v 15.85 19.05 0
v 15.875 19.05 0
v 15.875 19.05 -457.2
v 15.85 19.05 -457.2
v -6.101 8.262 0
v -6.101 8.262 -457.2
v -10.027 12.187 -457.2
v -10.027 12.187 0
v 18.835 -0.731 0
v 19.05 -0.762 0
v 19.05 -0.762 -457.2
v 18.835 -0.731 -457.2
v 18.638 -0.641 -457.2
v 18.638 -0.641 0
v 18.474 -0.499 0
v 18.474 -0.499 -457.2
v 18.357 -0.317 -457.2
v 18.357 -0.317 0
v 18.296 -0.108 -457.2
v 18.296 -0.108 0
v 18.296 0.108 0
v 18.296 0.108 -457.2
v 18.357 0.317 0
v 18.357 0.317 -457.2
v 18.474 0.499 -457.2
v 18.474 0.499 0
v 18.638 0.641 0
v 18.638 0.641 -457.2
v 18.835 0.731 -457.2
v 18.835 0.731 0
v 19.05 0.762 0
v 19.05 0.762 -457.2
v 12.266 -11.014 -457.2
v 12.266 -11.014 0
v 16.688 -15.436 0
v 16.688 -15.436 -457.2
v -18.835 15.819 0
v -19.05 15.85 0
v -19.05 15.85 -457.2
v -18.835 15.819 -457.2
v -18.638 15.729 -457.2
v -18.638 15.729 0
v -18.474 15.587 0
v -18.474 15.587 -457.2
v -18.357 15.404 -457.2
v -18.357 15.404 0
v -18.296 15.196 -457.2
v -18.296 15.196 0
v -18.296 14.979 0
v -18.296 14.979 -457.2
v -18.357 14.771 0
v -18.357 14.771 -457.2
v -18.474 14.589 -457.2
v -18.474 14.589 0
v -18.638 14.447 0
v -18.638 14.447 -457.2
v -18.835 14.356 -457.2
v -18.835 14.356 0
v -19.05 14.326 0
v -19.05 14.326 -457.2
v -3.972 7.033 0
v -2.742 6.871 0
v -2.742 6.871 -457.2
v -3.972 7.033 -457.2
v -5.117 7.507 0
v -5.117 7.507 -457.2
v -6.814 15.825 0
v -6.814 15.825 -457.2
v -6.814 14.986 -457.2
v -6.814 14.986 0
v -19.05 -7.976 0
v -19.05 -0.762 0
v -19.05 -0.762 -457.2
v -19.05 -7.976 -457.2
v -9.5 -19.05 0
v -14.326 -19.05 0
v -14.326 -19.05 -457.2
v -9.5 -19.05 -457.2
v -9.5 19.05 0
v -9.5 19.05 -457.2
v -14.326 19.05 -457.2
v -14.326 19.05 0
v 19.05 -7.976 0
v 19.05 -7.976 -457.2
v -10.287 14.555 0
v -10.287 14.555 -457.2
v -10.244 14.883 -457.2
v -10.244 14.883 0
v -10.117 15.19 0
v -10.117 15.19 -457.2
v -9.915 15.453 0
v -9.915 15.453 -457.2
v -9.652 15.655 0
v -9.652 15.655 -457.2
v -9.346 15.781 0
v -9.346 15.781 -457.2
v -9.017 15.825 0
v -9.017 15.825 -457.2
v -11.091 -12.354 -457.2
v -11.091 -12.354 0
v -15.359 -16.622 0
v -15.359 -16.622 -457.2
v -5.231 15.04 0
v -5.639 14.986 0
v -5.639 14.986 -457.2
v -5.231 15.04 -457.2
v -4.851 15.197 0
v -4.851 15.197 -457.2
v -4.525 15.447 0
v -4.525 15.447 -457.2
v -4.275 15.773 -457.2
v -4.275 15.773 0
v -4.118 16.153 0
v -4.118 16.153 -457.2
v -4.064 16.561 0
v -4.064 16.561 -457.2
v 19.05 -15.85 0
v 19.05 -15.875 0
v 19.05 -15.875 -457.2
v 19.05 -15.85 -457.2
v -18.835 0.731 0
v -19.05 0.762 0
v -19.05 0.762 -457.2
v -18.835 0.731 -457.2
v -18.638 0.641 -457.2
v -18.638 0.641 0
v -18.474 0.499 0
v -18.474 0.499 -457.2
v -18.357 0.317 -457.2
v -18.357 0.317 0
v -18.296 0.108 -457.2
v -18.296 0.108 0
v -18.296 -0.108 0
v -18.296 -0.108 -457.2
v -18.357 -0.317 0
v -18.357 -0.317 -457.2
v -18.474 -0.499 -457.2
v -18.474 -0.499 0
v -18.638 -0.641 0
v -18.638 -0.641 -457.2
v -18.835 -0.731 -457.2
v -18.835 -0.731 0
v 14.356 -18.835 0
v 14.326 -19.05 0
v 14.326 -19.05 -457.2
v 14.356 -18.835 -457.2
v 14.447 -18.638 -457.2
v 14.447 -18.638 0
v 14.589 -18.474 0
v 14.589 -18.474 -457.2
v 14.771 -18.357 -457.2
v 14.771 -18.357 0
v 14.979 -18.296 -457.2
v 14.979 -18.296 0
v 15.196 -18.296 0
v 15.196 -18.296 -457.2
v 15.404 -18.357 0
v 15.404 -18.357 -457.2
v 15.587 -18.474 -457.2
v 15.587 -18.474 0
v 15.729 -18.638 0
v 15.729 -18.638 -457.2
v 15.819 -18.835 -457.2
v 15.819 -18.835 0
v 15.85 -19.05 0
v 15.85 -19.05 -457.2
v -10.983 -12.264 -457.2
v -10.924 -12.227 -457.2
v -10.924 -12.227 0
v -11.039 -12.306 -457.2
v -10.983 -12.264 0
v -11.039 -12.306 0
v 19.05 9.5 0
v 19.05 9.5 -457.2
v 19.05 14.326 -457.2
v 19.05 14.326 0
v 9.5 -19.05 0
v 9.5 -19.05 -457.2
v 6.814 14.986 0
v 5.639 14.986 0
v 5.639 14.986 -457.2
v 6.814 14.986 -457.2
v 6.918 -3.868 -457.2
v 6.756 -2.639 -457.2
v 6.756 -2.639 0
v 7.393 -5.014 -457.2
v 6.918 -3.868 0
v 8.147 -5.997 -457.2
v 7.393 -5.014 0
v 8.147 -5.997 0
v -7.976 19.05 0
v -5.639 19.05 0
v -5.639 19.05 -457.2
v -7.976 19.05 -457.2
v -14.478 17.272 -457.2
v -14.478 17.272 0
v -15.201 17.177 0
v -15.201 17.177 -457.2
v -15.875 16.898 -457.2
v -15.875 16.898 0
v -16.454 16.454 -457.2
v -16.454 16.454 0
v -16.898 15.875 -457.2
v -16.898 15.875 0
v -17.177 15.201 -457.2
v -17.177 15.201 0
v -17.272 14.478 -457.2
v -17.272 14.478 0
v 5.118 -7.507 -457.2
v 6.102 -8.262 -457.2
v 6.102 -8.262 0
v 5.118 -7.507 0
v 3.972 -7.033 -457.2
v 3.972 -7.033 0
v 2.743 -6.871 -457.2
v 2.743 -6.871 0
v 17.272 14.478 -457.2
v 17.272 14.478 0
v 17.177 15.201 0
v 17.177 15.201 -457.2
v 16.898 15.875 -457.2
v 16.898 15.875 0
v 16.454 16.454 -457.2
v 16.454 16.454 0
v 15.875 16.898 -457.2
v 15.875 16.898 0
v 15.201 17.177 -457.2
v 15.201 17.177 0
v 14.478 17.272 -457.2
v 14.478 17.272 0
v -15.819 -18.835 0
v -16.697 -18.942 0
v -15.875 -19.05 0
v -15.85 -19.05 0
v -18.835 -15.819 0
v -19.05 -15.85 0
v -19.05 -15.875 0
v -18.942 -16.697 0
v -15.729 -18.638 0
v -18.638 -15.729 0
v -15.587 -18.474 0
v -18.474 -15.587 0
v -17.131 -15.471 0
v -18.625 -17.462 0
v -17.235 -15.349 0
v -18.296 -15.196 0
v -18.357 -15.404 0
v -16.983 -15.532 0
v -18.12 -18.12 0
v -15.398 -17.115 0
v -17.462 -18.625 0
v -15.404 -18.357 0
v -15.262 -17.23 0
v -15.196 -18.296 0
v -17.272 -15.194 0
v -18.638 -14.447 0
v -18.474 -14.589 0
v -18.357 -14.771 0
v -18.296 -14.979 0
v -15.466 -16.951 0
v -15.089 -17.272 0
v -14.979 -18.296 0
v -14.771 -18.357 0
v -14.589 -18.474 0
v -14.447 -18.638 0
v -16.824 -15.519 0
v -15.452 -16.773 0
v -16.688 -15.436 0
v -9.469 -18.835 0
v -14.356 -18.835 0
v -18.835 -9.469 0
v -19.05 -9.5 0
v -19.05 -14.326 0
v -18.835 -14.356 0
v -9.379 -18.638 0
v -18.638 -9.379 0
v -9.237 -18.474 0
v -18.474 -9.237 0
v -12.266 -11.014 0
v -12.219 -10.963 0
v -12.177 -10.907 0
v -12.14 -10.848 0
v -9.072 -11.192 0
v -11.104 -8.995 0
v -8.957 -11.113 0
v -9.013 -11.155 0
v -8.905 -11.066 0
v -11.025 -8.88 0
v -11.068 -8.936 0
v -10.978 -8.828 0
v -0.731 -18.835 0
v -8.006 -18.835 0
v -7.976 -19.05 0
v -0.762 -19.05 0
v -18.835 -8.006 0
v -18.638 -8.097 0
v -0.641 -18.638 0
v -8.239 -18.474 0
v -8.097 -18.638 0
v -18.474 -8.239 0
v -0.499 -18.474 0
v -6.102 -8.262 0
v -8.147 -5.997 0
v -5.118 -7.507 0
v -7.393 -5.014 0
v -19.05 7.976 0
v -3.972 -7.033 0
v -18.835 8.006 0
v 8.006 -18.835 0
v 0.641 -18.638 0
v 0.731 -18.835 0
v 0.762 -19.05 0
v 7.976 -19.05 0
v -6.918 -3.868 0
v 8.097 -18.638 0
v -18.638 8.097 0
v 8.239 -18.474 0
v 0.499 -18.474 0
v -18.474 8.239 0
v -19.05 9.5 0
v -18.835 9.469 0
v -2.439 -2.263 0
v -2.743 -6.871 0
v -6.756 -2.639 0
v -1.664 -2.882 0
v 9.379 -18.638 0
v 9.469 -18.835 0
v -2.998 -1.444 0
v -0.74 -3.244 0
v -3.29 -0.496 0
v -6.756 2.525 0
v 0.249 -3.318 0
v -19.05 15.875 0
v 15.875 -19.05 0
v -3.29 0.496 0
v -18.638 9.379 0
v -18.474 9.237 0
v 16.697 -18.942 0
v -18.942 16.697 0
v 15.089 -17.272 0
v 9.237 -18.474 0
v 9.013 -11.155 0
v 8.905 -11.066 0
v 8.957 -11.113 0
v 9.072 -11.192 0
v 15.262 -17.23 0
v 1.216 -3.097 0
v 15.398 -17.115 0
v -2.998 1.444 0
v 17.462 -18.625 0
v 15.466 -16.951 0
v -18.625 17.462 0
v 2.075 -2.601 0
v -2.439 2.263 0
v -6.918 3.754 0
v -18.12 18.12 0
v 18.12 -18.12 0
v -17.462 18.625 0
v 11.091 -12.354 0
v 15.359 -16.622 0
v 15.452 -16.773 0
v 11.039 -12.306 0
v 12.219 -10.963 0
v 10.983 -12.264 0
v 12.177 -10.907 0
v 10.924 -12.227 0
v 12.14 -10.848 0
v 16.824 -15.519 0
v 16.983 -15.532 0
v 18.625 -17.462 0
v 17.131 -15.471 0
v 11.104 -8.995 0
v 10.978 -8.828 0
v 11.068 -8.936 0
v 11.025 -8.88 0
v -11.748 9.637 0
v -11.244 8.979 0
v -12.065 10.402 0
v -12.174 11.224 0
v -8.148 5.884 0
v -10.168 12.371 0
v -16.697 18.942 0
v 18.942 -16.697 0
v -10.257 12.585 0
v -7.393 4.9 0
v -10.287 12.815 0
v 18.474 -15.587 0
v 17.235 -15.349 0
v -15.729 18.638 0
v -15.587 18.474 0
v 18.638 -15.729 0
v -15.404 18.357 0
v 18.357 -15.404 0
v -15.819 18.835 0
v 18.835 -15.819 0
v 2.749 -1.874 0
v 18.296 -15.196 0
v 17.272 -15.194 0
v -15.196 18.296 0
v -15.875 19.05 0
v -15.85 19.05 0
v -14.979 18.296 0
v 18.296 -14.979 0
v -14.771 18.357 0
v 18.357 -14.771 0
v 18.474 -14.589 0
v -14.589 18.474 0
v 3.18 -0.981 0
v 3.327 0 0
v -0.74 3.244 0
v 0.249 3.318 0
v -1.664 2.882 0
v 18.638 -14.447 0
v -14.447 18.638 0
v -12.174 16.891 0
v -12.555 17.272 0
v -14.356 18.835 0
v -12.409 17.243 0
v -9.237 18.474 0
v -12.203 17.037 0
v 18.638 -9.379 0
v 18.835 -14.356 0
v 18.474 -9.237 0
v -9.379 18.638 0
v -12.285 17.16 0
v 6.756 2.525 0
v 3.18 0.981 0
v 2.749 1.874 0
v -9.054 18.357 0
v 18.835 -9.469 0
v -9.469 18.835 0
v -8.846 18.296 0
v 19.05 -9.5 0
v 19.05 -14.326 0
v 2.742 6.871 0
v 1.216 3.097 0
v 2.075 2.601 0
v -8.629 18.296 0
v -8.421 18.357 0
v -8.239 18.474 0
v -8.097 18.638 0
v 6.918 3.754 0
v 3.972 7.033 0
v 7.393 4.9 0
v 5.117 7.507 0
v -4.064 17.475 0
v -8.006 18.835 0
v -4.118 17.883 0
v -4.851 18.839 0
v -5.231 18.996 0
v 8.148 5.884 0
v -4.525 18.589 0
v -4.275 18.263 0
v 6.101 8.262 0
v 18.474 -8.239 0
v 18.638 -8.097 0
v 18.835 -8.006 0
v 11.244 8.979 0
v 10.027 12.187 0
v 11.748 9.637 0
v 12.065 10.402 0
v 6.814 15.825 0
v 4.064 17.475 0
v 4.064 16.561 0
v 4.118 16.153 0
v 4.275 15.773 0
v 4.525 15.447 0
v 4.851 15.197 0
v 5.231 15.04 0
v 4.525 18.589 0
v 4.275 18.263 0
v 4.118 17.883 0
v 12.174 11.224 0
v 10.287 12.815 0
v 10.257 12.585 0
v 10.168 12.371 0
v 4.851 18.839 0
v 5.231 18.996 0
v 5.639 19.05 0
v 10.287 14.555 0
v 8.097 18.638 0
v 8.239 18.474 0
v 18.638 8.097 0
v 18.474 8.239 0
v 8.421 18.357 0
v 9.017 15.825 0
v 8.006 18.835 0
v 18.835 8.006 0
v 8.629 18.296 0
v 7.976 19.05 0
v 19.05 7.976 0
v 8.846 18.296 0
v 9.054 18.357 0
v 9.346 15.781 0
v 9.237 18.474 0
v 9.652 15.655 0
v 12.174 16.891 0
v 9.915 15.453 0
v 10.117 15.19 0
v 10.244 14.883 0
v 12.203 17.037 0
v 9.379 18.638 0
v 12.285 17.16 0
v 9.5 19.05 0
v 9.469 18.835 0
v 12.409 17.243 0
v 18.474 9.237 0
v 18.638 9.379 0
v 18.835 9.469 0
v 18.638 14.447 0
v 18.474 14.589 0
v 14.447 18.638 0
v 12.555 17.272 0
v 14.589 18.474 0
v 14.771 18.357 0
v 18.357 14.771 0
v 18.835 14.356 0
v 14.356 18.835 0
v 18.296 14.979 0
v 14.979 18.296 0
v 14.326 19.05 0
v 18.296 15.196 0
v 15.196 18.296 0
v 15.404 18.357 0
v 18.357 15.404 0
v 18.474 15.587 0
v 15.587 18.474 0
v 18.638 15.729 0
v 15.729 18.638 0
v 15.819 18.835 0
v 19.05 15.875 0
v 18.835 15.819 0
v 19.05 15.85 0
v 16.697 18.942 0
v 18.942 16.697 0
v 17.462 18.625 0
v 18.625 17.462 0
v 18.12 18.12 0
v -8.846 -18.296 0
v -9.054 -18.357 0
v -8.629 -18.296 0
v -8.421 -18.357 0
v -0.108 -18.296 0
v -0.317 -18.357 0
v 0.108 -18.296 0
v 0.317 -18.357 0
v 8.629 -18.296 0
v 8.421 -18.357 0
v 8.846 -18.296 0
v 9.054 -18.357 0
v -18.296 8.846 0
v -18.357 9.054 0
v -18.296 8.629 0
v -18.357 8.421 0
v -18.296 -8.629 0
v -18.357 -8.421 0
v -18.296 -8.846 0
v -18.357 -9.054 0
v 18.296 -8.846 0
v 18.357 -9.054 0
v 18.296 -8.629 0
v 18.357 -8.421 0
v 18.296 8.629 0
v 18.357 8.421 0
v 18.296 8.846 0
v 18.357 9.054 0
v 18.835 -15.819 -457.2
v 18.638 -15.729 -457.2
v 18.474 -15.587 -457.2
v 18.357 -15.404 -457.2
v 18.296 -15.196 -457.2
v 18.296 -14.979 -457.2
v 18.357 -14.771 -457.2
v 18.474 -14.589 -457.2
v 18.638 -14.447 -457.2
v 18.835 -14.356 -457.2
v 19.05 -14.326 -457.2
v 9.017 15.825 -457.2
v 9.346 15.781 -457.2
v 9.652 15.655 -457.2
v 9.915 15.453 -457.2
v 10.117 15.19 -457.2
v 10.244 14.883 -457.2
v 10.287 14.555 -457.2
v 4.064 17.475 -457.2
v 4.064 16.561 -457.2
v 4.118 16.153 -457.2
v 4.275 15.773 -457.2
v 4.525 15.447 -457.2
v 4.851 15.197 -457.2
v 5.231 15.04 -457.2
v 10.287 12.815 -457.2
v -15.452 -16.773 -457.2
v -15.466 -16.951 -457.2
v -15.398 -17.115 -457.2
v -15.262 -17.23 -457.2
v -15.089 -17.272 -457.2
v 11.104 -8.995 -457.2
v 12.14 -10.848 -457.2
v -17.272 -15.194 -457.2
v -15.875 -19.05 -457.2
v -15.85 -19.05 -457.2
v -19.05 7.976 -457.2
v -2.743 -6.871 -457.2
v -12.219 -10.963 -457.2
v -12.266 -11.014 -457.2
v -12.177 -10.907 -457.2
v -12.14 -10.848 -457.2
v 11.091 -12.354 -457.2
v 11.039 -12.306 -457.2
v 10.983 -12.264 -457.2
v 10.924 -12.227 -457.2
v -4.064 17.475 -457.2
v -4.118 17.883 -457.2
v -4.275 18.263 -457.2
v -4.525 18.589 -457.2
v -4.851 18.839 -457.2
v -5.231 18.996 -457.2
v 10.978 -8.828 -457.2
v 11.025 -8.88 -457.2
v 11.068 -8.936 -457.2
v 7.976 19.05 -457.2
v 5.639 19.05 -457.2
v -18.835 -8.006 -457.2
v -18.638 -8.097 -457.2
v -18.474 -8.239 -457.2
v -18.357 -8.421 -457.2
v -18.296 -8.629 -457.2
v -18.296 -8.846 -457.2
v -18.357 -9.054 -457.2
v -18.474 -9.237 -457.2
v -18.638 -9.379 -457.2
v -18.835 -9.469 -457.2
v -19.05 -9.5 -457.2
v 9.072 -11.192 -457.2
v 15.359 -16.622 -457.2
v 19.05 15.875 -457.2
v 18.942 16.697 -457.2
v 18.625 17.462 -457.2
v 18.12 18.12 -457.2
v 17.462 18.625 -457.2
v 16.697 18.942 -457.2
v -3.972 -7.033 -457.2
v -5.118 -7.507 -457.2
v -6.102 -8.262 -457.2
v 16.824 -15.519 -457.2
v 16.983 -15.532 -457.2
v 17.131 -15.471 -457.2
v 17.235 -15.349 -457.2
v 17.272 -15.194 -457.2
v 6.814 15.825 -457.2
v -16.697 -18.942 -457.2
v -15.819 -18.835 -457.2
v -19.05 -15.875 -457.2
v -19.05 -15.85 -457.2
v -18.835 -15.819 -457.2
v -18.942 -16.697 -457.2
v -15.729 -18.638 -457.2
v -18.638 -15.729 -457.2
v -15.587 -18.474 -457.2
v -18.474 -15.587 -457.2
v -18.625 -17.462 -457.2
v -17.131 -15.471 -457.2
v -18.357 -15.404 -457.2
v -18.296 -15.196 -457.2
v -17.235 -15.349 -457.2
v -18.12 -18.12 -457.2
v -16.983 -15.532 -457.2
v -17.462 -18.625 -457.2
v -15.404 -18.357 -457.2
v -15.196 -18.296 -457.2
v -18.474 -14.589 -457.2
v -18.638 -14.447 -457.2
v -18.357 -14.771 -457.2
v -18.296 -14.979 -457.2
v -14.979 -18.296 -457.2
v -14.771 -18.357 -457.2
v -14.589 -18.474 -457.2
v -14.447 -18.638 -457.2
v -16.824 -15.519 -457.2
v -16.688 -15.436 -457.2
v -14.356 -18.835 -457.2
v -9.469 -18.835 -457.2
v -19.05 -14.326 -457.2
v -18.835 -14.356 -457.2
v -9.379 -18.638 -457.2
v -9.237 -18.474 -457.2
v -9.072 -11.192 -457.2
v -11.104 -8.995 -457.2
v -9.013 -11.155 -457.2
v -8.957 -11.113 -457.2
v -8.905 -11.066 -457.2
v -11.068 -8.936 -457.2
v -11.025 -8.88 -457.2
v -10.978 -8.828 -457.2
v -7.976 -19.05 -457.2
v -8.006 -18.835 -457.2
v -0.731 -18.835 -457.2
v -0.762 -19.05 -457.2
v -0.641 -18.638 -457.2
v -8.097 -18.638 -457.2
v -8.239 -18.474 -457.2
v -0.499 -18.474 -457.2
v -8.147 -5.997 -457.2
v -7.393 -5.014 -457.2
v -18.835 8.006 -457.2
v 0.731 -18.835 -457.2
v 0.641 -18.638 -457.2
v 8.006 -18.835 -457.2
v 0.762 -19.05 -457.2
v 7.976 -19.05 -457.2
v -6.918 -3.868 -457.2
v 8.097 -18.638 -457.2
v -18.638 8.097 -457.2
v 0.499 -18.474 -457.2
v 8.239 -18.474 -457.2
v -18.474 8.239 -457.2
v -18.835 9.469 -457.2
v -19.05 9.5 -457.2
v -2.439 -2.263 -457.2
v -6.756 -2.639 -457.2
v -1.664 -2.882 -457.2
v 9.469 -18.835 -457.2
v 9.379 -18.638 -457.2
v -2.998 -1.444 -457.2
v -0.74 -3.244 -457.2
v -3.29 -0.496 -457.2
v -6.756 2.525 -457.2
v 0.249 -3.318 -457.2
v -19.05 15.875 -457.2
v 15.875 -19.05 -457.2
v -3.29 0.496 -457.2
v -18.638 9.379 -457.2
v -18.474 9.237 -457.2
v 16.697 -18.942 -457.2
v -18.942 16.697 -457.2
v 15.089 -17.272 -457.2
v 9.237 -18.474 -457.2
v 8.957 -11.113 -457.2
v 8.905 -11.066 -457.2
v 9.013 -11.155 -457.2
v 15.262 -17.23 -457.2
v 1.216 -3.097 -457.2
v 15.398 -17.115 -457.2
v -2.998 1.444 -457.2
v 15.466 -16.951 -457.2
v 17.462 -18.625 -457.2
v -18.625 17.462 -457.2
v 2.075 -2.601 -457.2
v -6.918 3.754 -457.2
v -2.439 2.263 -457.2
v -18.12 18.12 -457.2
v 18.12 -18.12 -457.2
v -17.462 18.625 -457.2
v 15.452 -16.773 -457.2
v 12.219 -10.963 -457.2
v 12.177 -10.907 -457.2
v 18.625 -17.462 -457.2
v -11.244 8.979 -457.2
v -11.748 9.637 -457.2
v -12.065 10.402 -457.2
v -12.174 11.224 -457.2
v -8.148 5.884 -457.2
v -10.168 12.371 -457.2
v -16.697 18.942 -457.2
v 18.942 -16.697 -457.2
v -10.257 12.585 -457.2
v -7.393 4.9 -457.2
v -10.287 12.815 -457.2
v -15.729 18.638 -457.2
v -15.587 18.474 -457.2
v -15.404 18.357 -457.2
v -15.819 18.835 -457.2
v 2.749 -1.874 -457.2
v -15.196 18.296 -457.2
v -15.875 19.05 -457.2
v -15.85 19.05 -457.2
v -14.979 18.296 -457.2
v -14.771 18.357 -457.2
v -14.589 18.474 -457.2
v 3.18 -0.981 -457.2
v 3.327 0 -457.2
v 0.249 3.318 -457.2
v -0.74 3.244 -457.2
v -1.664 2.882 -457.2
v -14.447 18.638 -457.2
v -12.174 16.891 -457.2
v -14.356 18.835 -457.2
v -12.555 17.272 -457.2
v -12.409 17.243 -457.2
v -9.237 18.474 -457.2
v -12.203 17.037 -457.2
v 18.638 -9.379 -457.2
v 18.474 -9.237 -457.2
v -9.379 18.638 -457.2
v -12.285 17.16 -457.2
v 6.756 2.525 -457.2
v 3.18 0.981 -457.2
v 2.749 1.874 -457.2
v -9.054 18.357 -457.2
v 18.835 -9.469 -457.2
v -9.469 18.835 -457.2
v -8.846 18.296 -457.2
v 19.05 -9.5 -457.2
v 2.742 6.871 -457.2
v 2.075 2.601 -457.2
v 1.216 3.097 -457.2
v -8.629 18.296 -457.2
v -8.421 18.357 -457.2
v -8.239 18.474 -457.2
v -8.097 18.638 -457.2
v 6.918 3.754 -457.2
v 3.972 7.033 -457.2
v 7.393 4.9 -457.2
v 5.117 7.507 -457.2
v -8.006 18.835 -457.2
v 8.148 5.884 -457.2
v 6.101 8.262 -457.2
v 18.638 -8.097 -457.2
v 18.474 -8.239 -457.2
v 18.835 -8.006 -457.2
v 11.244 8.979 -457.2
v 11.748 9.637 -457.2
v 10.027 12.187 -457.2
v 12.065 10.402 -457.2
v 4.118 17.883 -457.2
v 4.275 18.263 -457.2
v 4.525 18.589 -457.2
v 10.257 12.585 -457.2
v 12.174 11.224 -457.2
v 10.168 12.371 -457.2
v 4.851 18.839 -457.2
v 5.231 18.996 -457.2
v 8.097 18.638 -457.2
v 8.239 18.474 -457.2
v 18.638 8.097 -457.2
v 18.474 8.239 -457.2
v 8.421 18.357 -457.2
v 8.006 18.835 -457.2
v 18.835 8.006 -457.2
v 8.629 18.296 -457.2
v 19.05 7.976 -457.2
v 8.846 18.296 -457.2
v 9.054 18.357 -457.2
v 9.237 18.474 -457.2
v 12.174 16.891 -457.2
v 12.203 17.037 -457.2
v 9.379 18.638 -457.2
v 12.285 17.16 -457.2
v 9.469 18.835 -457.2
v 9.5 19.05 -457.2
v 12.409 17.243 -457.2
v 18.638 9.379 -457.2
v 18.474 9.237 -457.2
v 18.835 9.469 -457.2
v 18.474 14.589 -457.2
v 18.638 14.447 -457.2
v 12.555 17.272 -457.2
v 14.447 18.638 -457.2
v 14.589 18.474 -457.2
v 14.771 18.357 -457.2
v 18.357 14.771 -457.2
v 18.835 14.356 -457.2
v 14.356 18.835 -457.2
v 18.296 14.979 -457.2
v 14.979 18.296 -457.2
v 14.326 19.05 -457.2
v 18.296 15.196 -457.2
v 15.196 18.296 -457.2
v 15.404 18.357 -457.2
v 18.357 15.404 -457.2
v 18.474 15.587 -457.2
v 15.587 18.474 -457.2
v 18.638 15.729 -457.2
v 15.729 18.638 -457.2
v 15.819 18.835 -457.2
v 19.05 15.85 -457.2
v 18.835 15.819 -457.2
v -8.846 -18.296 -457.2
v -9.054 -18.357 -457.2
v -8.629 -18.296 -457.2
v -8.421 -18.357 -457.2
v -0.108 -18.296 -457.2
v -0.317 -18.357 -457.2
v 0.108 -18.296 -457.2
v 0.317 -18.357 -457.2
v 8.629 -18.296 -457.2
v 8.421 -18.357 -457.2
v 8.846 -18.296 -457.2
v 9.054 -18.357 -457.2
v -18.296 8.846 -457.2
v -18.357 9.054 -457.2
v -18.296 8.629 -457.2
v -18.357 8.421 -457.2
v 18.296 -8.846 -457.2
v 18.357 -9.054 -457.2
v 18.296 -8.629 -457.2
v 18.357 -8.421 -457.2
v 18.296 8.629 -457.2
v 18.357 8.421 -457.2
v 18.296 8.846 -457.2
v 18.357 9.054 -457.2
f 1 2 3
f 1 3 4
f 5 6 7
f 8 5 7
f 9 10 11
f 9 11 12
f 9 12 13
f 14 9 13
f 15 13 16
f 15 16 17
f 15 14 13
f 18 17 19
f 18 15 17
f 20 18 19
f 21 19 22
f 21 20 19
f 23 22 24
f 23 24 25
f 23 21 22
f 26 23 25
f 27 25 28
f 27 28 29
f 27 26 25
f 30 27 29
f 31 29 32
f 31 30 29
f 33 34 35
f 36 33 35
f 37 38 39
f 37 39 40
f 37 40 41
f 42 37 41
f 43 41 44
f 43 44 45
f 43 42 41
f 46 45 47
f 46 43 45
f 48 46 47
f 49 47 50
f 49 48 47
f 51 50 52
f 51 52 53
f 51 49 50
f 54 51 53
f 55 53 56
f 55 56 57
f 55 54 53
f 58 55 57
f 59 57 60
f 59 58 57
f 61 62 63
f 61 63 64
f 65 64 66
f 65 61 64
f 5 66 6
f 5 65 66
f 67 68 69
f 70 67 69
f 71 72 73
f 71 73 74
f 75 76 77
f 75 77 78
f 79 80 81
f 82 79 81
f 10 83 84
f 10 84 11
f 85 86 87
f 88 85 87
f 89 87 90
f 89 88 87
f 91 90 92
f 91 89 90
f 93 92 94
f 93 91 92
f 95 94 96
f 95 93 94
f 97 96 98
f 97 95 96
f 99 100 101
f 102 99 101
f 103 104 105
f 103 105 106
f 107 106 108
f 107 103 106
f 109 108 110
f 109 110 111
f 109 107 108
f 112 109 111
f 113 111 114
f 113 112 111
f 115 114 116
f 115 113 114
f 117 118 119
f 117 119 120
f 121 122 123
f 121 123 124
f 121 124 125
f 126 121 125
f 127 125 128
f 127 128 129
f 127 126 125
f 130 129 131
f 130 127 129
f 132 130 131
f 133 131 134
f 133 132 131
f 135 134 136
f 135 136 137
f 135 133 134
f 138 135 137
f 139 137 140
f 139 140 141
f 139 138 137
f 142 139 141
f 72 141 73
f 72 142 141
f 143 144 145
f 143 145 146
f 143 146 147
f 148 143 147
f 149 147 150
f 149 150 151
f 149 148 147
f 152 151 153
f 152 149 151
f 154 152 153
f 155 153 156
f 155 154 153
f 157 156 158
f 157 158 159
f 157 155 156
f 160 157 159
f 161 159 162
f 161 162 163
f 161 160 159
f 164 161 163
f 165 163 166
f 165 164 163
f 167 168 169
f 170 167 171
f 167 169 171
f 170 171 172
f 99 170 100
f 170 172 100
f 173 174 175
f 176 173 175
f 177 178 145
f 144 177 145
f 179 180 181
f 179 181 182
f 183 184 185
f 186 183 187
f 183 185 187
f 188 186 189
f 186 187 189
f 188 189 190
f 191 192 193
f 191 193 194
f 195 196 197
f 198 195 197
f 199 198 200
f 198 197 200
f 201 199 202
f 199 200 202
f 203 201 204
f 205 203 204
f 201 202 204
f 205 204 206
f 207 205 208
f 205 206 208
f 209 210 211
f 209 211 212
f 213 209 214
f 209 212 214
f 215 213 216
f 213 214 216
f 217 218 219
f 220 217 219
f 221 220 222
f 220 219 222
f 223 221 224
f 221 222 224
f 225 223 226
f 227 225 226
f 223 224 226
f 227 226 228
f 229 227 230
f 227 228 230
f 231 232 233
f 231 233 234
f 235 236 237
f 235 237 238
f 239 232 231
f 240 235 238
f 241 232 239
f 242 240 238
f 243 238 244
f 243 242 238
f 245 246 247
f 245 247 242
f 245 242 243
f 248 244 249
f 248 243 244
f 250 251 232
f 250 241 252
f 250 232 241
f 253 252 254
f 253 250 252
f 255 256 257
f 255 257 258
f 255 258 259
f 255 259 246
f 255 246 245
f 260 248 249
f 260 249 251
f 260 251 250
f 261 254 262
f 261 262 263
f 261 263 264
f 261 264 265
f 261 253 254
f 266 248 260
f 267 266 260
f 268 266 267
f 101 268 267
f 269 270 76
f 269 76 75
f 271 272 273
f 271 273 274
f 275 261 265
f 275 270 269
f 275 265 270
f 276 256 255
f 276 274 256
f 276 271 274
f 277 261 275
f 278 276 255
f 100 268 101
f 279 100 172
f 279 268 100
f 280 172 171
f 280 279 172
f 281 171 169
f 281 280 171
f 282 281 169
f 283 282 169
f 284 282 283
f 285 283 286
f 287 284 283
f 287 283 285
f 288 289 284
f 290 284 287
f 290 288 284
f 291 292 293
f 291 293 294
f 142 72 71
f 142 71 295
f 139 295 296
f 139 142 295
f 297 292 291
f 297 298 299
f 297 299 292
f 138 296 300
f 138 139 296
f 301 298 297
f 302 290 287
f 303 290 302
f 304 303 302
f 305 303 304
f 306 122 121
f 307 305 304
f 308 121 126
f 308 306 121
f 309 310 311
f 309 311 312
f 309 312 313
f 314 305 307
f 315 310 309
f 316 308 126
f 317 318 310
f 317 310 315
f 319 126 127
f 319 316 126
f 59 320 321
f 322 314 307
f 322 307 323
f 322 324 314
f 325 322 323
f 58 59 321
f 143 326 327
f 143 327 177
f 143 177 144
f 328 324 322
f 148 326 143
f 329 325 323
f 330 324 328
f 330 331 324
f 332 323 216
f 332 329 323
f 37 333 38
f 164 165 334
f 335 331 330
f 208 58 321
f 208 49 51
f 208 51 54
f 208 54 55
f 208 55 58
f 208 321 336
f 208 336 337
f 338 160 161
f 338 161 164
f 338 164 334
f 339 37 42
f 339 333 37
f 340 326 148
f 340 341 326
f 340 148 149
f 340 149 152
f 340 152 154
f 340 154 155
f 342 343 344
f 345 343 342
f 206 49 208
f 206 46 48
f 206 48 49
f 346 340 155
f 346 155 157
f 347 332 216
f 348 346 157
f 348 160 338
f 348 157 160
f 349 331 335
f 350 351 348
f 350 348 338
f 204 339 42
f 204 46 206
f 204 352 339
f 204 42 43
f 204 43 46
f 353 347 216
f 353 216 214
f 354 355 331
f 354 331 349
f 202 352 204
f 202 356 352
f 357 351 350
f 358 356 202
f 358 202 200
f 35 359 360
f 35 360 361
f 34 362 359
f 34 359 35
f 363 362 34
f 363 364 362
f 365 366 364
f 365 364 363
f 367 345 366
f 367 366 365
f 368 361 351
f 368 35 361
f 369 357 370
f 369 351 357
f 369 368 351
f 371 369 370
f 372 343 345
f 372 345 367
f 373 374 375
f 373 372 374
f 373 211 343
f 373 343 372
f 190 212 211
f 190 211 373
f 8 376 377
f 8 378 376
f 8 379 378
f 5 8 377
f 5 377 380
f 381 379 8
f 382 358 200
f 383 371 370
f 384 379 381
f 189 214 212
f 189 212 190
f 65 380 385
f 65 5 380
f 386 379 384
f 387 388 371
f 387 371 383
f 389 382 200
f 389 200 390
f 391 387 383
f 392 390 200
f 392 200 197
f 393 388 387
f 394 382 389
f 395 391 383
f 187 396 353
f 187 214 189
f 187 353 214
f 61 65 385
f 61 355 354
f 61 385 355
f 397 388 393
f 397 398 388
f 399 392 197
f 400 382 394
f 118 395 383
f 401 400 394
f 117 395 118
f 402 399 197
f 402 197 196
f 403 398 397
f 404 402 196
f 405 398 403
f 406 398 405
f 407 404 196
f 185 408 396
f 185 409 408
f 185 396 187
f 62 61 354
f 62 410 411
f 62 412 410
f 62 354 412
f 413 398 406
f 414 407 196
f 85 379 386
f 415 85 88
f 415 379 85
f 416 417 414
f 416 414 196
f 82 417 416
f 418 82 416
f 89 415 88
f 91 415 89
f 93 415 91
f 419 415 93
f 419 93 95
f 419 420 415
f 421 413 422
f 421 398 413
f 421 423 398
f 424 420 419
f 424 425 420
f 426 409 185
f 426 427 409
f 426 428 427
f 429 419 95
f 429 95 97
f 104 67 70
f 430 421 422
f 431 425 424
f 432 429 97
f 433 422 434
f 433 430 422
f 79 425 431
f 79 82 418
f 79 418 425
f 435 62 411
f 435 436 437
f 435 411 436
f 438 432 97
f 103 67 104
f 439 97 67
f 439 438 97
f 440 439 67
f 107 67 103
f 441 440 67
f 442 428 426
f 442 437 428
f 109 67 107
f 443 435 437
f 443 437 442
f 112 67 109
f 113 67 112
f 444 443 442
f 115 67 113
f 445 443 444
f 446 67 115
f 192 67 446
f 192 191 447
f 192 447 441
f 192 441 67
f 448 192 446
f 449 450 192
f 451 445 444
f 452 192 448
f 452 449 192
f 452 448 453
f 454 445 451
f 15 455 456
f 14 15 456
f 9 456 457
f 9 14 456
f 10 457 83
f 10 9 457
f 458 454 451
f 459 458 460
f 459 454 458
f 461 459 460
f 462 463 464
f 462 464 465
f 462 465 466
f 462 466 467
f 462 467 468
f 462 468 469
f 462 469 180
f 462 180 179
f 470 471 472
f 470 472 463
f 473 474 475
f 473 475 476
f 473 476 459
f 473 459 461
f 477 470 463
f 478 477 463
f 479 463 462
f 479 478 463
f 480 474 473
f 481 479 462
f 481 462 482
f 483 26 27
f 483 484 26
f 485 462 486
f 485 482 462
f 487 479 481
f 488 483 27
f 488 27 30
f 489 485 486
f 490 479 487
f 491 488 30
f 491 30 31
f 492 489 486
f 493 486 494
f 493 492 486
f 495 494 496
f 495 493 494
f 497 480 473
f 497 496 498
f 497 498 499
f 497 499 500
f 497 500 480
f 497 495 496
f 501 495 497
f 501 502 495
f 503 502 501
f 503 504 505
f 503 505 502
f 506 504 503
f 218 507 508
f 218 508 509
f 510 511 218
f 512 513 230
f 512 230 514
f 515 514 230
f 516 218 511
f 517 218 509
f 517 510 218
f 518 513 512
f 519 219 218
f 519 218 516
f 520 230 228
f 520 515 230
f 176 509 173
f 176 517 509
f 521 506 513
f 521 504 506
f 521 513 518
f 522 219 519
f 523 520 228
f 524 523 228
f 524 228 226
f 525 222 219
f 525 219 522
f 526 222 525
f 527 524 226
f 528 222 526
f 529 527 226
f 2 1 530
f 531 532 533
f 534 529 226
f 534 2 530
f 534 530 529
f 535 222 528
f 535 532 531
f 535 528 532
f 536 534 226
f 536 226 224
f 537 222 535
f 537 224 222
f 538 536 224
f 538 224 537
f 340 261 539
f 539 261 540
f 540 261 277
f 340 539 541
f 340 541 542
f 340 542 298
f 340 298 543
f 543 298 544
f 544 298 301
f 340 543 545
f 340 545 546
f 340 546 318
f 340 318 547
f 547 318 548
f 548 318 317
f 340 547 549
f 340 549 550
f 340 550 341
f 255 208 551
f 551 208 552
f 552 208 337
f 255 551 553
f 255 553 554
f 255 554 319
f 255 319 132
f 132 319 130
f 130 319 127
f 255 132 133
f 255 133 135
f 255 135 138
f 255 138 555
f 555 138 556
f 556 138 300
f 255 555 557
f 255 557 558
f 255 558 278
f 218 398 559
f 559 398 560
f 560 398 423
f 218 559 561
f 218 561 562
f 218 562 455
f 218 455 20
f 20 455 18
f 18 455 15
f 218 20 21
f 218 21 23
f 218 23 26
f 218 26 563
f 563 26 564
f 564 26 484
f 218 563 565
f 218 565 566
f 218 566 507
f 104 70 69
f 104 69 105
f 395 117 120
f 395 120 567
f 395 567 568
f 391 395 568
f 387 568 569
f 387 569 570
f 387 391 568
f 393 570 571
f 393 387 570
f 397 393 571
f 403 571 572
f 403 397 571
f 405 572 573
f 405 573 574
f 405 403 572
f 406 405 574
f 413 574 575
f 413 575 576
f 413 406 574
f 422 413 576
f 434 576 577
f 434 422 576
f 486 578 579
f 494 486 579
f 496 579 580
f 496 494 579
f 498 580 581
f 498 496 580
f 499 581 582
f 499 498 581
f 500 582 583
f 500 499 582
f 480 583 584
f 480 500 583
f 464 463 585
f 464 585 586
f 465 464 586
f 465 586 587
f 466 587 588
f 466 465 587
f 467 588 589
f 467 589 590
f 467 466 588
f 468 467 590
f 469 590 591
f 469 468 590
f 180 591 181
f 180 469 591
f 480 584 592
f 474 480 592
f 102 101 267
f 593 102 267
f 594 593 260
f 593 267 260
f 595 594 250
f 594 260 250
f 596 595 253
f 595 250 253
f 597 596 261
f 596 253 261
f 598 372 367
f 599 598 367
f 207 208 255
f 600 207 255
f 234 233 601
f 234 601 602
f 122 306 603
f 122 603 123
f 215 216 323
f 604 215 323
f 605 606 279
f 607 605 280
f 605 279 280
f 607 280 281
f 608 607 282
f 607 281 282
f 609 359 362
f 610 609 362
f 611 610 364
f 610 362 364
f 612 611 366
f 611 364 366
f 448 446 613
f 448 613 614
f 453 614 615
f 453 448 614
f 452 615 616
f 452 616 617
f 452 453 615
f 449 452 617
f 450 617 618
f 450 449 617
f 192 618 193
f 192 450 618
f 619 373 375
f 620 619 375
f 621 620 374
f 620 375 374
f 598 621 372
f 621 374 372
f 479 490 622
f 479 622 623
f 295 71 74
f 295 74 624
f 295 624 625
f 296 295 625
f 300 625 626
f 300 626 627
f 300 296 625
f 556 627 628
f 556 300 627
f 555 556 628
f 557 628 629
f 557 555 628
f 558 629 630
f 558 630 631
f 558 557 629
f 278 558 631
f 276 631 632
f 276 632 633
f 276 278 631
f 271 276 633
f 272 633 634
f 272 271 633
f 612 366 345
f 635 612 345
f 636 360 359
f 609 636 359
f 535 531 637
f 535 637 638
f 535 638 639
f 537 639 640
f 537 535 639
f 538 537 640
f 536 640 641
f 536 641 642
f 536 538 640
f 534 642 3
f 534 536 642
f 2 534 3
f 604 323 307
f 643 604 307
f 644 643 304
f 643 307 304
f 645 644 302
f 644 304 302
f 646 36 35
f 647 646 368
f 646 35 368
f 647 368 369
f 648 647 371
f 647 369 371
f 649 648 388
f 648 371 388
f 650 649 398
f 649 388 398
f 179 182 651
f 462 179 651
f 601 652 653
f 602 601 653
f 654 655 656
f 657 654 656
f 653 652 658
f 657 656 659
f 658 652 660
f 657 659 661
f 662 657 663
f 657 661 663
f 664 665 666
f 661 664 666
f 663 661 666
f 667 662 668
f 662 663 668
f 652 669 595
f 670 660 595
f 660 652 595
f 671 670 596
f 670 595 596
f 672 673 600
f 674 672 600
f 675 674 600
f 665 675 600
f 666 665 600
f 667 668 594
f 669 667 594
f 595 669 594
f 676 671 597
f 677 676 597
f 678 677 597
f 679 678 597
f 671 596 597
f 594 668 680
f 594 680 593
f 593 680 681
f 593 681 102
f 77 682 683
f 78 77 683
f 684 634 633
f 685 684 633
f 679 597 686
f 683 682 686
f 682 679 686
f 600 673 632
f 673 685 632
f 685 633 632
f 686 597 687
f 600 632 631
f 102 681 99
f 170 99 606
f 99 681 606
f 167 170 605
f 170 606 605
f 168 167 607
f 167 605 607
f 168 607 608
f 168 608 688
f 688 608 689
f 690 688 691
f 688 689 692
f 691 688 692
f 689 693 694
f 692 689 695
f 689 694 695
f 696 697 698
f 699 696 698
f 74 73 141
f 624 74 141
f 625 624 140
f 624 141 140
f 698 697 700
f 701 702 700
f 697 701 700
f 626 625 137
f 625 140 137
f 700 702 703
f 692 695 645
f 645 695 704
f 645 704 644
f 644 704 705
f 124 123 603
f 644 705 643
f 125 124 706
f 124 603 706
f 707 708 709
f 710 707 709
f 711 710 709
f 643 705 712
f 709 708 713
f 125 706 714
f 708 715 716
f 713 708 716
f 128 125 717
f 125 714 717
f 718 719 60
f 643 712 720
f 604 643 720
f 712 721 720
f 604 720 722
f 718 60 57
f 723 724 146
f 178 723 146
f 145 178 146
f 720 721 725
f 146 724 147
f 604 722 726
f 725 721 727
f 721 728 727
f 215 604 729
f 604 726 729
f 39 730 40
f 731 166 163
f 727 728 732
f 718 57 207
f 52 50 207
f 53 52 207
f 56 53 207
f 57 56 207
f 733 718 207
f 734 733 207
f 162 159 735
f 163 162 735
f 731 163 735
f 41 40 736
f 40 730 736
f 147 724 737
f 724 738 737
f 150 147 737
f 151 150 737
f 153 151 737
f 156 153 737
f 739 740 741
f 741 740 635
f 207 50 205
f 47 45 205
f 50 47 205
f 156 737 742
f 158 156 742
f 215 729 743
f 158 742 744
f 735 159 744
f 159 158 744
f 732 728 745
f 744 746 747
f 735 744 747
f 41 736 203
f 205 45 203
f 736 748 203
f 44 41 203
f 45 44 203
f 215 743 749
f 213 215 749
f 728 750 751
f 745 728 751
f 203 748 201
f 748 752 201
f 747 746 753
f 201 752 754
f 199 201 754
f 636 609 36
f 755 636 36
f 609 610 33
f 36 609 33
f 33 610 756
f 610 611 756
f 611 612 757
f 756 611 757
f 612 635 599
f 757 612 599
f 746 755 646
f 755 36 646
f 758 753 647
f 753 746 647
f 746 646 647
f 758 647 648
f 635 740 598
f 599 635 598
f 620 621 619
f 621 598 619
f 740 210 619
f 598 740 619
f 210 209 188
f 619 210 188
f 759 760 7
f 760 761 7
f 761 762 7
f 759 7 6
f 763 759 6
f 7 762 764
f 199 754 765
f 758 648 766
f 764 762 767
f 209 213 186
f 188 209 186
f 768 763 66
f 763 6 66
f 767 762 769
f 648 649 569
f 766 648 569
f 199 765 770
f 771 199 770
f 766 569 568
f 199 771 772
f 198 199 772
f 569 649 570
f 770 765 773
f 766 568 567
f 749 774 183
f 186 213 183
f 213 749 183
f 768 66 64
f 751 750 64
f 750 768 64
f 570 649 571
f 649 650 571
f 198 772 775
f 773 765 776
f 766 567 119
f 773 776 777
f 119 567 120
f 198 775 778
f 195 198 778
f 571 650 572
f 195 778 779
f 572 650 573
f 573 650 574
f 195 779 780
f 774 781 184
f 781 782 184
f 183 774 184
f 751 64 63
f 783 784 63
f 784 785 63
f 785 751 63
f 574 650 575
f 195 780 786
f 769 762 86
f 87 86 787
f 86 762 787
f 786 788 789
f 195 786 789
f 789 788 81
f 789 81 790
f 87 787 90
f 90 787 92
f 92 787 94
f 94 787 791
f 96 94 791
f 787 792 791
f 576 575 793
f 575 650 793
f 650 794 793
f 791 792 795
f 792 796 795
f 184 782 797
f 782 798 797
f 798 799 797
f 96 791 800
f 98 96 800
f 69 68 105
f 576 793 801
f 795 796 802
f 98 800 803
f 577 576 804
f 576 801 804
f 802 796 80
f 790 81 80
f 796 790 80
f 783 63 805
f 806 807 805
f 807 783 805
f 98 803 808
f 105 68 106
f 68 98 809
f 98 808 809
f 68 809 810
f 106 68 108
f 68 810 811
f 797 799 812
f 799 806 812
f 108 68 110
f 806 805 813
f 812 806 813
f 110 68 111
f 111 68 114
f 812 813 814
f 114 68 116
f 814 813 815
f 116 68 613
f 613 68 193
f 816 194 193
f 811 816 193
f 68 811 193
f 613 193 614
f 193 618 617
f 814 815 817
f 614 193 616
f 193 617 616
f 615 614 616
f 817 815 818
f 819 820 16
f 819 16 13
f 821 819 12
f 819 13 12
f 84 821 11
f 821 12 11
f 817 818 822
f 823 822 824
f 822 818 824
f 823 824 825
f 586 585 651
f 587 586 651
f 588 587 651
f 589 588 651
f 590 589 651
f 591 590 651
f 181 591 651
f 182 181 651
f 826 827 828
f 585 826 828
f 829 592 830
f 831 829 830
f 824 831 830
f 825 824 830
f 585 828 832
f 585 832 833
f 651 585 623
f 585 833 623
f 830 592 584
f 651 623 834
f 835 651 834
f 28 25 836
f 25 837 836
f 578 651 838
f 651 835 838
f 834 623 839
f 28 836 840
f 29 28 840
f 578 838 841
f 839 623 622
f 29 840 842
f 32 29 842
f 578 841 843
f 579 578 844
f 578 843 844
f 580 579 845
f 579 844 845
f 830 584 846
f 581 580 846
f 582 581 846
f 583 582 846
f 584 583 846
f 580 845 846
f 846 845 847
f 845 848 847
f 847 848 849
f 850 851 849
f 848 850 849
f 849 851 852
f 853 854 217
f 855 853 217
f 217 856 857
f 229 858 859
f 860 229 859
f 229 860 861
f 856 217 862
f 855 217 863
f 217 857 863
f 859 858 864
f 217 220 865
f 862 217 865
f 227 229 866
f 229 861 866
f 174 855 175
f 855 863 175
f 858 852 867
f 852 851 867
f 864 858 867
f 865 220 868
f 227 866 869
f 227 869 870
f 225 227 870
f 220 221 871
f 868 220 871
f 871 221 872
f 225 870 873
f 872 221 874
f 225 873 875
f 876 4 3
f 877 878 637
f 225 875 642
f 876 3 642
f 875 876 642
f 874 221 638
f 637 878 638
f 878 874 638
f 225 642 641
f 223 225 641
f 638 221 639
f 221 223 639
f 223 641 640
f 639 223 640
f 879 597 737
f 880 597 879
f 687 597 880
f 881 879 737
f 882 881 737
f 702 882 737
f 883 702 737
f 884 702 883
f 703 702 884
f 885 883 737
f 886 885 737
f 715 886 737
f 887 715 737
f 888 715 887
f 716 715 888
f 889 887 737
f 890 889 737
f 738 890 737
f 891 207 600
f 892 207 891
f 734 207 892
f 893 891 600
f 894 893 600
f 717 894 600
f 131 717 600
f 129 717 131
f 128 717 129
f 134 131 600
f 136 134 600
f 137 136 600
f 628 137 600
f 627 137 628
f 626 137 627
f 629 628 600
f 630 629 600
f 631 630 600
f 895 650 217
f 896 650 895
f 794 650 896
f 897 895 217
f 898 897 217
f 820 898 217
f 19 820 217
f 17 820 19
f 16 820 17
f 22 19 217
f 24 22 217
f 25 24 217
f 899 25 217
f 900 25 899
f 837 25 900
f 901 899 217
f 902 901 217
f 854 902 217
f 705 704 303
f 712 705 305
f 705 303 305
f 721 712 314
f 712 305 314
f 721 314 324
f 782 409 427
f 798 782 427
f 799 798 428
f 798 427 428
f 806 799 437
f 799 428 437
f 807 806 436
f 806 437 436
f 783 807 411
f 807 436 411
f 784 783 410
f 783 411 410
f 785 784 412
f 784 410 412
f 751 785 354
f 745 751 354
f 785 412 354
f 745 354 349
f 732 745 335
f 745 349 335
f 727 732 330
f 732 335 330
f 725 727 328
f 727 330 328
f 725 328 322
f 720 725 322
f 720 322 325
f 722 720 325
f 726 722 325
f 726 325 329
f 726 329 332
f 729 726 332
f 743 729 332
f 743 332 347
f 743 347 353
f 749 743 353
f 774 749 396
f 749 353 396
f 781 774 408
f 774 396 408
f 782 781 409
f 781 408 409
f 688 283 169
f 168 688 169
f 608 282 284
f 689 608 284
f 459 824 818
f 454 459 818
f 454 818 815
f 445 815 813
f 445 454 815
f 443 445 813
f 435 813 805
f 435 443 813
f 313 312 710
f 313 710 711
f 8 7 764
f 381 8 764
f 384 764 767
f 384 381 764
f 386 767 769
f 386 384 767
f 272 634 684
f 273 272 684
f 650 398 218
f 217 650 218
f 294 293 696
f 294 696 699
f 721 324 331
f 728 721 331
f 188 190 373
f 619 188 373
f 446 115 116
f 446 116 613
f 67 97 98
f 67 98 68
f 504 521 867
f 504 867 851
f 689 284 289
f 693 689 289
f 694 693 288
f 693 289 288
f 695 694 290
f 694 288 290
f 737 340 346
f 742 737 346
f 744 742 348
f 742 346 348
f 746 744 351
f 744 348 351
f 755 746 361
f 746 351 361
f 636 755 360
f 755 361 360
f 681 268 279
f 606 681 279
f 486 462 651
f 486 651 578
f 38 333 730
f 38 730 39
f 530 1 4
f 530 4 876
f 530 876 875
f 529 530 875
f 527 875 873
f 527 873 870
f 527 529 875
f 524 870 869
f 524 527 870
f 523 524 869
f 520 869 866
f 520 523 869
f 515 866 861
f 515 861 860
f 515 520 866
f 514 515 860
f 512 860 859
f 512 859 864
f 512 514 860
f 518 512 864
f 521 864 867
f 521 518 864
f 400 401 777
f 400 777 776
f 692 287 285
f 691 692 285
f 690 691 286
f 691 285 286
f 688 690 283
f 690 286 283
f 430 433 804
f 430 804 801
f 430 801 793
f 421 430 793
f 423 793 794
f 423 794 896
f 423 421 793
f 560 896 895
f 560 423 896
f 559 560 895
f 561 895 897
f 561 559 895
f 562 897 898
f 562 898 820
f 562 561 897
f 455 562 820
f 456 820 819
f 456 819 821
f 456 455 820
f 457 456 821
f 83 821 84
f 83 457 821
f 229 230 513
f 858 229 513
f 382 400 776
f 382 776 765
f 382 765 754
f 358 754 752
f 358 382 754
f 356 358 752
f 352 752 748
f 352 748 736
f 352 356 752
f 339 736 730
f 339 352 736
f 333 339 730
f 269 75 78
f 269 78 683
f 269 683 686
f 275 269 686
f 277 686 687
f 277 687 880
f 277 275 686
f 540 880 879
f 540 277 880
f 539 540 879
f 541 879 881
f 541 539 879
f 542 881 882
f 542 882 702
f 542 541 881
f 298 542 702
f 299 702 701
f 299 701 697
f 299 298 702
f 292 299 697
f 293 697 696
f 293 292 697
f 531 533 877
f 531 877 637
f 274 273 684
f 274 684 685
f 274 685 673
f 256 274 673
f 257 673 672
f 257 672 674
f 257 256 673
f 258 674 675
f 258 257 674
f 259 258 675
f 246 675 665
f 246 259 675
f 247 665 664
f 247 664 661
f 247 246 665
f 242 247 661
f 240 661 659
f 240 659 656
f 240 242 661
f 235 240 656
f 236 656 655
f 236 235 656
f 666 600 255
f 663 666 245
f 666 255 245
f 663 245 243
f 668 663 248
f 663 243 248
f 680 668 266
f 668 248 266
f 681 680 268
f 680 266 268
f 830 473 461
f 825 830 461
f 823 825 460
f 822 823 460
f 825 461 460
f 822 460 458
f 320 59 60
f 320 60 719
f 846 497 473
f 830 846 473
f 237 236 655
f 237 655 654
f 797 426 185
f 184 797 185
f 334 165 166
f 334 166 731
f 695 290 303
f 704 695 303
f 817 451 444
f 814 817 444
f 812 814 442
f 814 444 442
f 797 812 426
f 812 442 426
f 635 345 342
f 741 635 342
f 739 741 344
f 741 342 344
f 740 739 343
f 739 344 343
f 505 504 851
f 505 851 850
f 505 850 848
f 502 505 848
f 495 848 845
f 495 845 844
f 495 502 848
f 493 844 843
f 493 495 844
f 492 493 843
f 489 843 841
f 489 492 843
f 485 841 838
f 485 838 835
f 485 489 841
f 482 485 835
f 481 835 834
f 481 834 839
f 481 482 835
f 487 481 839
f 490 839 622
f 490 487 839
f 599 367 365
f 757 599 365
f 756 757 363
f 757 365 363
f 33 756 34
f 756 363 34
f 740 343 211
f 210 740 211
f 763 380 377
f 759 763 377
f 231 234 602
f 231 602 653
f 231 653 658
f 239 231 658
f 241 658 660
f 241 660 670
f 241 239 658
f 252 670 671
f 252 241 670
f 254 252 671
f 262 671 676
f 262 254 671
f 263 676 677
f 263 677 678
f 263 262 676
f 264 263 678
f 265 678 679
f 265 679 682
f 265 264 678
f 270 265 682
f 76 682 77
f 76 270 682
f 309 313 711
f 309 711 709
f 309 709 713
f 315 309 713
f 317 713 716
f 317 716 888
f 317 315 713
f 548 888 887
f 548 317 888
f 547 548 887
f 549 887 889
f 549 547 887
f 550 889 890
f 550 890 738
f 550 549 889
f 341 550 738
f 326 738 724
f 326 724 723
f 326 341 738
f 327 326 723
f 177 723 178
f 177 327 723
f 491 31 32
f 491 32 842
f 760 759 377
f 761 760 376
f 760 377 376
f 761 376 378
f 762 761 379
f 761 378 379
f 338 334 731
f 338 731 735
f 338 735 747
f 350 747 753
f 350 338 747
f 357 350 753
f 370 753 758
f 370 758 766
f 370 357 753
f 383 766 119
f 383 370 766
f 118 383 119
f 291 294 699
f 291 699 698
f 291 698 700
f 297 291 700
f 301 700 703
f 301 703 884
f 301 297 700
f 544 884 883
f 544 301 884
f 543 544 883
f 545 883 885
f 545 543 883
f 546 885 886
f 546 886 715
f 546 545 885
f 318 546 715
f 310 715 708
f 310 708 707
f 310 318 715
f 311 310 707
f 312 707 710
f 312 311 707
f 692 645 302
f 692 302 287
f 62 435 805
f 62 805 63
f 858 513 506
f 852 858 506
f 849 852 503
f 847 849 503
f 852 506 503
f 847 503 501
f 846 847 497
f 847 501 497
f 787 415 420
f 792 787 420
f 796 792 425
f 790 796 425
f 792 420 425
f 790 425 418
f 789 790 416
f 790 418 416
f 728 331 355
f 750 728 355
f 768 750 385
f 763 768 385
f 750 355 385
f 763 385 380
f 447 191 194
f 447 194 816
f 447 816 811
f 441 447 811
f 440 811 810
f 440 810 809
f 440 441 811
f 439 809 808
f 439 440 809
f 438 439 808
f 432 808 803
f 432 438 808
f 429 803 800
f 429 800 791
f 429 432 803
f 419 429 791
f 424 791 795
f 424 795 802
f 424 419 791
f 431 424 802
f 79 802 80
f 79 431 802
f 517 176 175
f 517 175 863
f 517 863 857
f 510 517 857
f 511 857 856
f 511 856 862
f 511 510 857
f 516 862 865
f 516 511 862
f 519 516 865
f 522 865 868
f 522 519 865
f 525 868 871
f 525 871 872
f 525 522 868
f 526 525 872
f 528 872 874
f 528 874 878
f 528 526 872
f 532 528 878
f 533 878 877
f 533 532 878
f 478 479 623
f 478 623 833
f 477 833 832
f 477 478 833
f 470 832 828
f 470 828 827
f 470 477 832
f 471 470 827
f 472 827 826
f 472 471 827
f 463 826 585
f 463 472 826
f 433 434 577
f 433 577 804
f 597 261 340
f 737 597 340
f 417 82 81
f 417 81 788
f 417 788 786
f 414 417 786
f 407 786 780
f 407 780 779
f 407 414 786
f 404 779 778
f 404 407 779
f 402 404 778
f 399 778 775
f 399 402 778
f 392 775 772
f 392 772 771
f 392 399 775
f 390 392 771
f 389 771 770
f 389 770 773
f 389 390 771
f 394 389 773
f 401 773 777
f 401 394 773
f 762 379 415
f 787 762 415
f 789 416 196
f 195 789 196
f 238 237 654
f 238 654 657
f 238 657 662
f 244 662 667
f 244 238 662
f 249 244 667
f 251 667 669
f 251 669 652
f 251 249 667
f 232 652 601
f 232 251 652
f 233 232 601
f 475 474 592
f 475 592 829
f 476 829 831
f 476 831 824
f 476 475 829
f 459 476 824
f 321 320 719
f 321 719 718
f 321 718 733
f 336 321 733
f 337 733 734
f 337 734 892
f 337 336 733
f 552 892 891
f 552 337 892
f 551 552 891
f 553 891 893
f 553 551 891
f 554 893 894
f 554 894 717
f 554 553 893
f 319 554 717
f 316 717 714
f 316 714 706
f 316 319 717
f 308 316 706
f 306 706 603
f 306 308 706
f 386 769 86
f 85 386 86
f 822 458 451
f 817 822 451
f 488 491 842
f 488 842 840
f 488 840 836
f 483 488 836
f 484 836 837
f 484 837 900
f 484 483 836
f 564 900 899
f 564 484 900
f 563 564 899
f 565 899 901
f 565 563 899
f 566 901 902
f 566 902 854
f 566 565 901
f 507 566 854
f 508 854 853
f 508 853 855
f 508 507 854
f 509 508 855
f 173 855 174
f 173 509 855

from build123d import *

# Parameters (mm, degrees)
SKETCH1_R      = 3.3274
EXTRUDE1_DEPTH = 457.2


with BuildPart() as part:
    # Sketch1 → Extrude1 (new body)
    with BuildSketch(Plane.XY):
        with BuildLine():
            Line((6.814144258, 15.824710921), (9.017, 15.824710921))
            ThreePointArc((9.017, 15.824710921), (9.915025612, 15.452736533), (10.287, 14.554710921))
            Line((10.287, 14.554710921), (10.287, 12.815421755))
            ThreePointArc((10.287, 12.815421755), (10.219314574, 12.47518159), (10.026564972, 12.186750874))
            Line((10.026564972, 12.186750874), (6.100754025, 8.261601293))
            ThreePointArc((6.100754025, 8.261601293), (4.55990611, 7.23218044), (2.742421178, 6.8707))
            Line((2.742421178, 6.8707), (-2.742421178, 6.8707))
            ThreePointArc((-2.742421178, 6.8707), (-4.55990611, 7.23218044), (-6.100754025, 8.261601293))
            Line((-6.100754025, 8.261601293), (-10.026564972, 12.186750874))
            ThreePointArc((-10.026564972, 12.186750874), (-10.219314574, 12.47518159), (-10.287, 12.815421755))
            Line((-10.287, 12.815421755), (-10.287, 14.554710921))
            ThreePointArc((-10.287, 14.554710921), (-9.915025612, 15.452736533), (-9.017, 15.824710921))
            Line((-9.017, 15.824710921), (-6.814144258, 15.824710921))
            Line((-6.814144258, 15.824710921), (-6.814144258, 14.986))
            Line((-6.814144258, 14.986), (-5.6388, 14.986))
            ThreePointArc((-5.6388, 14.986), (-4.525248241, 15.447248241), (-4.064, 16.5608))
            Line((-4.064, 16.5608), (-4.064, 17.4752))
            ThreePointArc((-4.064, 17.4752), (-4.525248241, 18.588751759), (-5.6388, 19.05))
            Line((-5.6388, 19.05), (-7.9756, 19.05))
            ThreePointArc((-7.9756, 19.05), (-8.7376, 18.288), (-9.4996, 19.05))
            Line((-9.4996, 19.05), (-14.3256, 19.05))
            ThreePointArc((-14.3256, 19.05), (-15.0876, 18.288), (-15.8496, 19.05))
            Line((-15.8496, 19.05), (-15.875, 19.05))
            ThreePointArc((-15.875, 19.05), (-18.12006403, 18.12006403), (-19.05, 15.875))
            Line((-19.05, 15.875), (-19.05, 15.8496))
            ThreePointArc((-19.05, 15.8496), (-18.288, 15.0876), (-19.05, 14.3256))
            Line((-19.05, 14.3256), (-19.05, 9.4996))
            ThreePointArc((-19.05, 9.4996), (-18.288, 8.7376), (-19.05, 7.9756))
            Line((-19.05, 7.9756), (-19.05, 0.762))
            ThreePointArc((-19.05, 0.762), (-18.288, 0), (-19.05, -0.762))
            Line((-19.05, -0.762), (-19.05, -7.9756))
            ThreePointArc((-19.05, -7.9756), (-18.288, -8.7376), (-19.05, -9.4996))
            Line((-19.05, -9.4996), (-19.05, -14.3256))
            ThreePointArc((-19.05, -14.3256), (-18.288, -15.0876), (-19.05, -15.8496))
            Line((-19.05, -15.8496), (-19.05, -15.875))
            ThreePointArc((-19.05, -15.875), (-18.12006403, -18.12006403), (-15.875, -19.05))
            Line((-15.875, -19.05), (-15.8496, -19.05))
            ThreePointArc((-15.8496, -19.05), (-15.0876, -18.288), (-14.3256, -19.05))
            Line((-14.3256, -19.05), (-9.4996, -19.05))
            ThreePointArc((-9.4996, -19.05), (-8.7376, -18.288), (-7.9756, -19.05))
            Line((-7.9756, -19.05), (-0.762, -19.05))
            ThreePointArc((-0.762, -19.05), (0, -18.288), (0.762, -19.05))
            Line((0.762, -19.05), (7.9756, -19.05))
            ThreePointArc((7.9756, -19.05), (8.7376, -18.288), (9.4996, -19.05))
            Line((9.4996, -19.05), (14.3256, -19.05))
            ThreePointArc((14.3256, -19.05), (15.0876, -18.288), (15.8496, -19.05))
            Line((15.8496, -19.05), (15.875, -19.05))
            ThreePointArc((15.875, -19.05), (18.12006403, -18.12006403), (19.05, -15.875))
            Line((19.05, -15.875), (19.05, -15.8496))
            ThreePointArc((19.05, -15.8496), (18.288, -15.0876), (19.05, -14.3256))
            Line((19.05, -14.3256), (19.05, -9.4996))
            ThreePointArc((19.05, -9.4996), (18.288, -8.7376), (19.05, -7.9756))
            Line((19.05, -7.9756), (19.05, -0.762))
            ThreePointArc((19.05, -0.762), (18.288, 0), (19.05, 0.762))
            Line((19.05, 0.762), (19.05, 7.9756))
            ThreePointArc((19.05, 7.9756), (18.288, 8.7376), (19.05, 9.4996))
            Line((19.05, 9.4996), (19.05, 14.3256))
            ThreePointArc((19.05, 14.3256), (18.288, 15.0876), (19.05, 15.8496))
            Line((19.05, 15.8496), (19.05, 15.875))
            ThreePointArc((19.05, 15.875), (18.12006403, 18.12006403), (15.875, 19.05))
            Line((15.875, 19.05), (15.8496, 19.05))
            ThreePointArc((15.8496, 19.05), (15.0876, 18.288), (14.3256, 19.05))
            Line((14.3256, 19.05), (9.4996, 19.05))
            ThreePointArc((9.4996, 19.05), (8.7376, 18.288), (7.9756, 19.05))
            Line((7.9756, 19.05), (5.6388, 19.05))
            ThreePointArc((5.6388, 19.05), (4.525248241, 18.588751759), (4.064, 17.4752))
            Line((4.064, 17.4752), (4.064, 16.5608))
            ThreePointArc((4.064, 16.5608), (4.525248241, 15.447248241), (5.6388, 14.986))
            Line((5.6388, 14.986), (6.814144258, 14.986))
            Line((6.814144258, 14.986), (6.814144258, 15.824710921))
        make_face()
        Circle(SKETCH1_R, mode=Mode.SUBTRACT)
        with BuildLine():
            Line((17.272, -15.193619561), (17.272, 14.478))
            ThreePointArc((17.272, 14.478), (16.453656347, 16.453656347), (14.478, 17.272))
            Line((14.478, 17.272), (12.554627238, 17.272))
            ThreePointArc((12.554627238, 17.272), (12.285219554, 17.160407684), (12.173627238, 16.891))
            Line((12.173627238, 16.891), (12.173627238, 11.224276306))
            ThreePointArc((12.173627238, 11.224276306), (11.931893574, 10.009132858), (11.243502135, 8.979023159))
            Line((11.243502135, 8.979023159), (8.147867153, 5.883909687))
            ThreePointArc((8.147867153, 5.883909687), (7.118033561, 4.342865578), (6.7564, 2.525010979))
            Line((6.7564, 2.525010979), (6.7564, -2.638829998))
            ThreePointArc((6.7564, -2.638829998), (7.117934192, -4.456444709), (8.147499936, -5.99736151))
            Line((8.147499936, -5.99736151), (10.978133922, -8.828137555))
            ThreePointArc((10.978133922, -8.828137555), (11.047042355, -8.907266312), (11.104427332, -8.995111041))
            Line((11.104427332, -8.995111041), (12.13998256, -10.847500325))
            ThreePointArc((12.13998256, -10.847500325), (12.197373304, -10.935352679), (12.266289489, -11.014487331))
            Line((12.266289489, -11.014487331), (16.687520892, -15.435718734))
            ThreePointArc((16.687520892, -15.435718734), (17.060643194, -15.509937374), (17.272, -15.193619561))
        make_face(mode=Mode.SUBTRACT)
        with BuildLine():
            Line((-12.173627238, 11.224276306), (-12.173627238, 16.891))
            ThreePointArc((-12.173627238, 16.891), (-12.285219554, 17.160407684), (-12.554627238, 17.272))
            Line((-12.554627238, 17.272), (-14.478, 17.272))
            ThreePointArc((-14.478, 17.272), (-16.453656347, 16.453656347), (-17.272, 14.478))
            Line((-17.272, 14.478), (-17.272, -15.193619561))
            ThreePointArc((-17.272, -15.193619561), (-17.060643194, -15.509937374), (-16.687520892, -15.435718734))
            Line((-16.687520892, -15.435718734), (-12.266289488, -11.014487333))
            ThreePointArc((-12.266289488, -11.014487333), (-12.197373302, -10.935352681), (-12.139982558, -10.847500326))
            Line((-12.139982558, -10.847500326), (-11.104427331, -8.995111042))
            ThreePointArc((-11.104427331, -8.995111042), (-11.047042353, -8.907266313), (-10.978133921, -8.828137556))
            Line((-10.978133921, -8.828137556), (-8.147499934, -5.997361511))
            ThreePointArc((-8.147499934, -5.997361511), (-7.11793419, -4.45644471), (-6.756399998, -2.638829999))
            Line((-6.756399998, -2.638829999), (-6.756399998, 2.525010979))
            ThreePointArc((-6.756399998, 2.525010979), (-7.118033559, 4.342865578), (-8.147867152, 5.883909688))
            Line((-8.147867152, 5.883909688), (-11.243502135, 8.979023158))
            ThreePointArc((-11.243502135, 8.979023158), (-11.931893574, 10.009132857), (-12.173627238, 11.224276306))
        make_face(mode=Mode.SUBTRACT)
        with BuildLine():
            Line((15.358897182, -16.621566737), (11.090984974, -12.353654529))
            ThreePointArc((11.090984974, -12.353654529), (11.011857946, -12.284744111), (10.924014656, -12.227356929))
            Line((10.924014656, -12.227356929), (9.072208991, -11.192066981))
            ThreePointArc((9.072208991, -11.192066981), (8.984358076, -11.134674031), (8.905225153, -11.06575586))
            Line((8.905225153, -11.06575586), (6.101578488, -8.261968492))
            ThreePointArc((6.101578488, -8.261968492), (4.560603247, -7.232279806), (2.742878424, -6.870700004))
            Line((2.742878424, -6.870700004), (-2.742878422, -6.870700004))
            ThreePointArc((-2.742878422, -6.870700004), (-4.560603245, -7.232279806), (-6.101578486, -8.261968491))
            Line((-6.101578486, -8.261968491), (-8.905225151, -11.06575586))
            ThreePointArc((-8.905225151, -11.06575586), (-8.984358074, -11.134674031), (-9.072208989, -11.19206698))
            Line((-9.072208989, -11.19206698), (-10.924014654, -12.227356929))
            ThreePointArc((-10.924014654, -12.227356929), (-11.011857944, -12.284744111), (-11.090984971, -12.353654529))
            Line((-11.090984971, -12.353654529), (-15.35889718, -16.621566737))
            ThreePointArc((-15.35889718, -16.621566737), (-15.441490846, -17.036793139), (-15.0894789, -17.272000001))
            Line((-15.0894789, -17.272000001), (15.089478903, -17.272000001))
            ThreePointArc((15.089478903, -17.272000001), (15.441490849, -17.036793139), (15.358897182, -16.621566737))
        make_face(mode=Mode.SUBTRACT)
    extrude(amount=-EXTRUDE1_DEPTH)


solid = part.part
